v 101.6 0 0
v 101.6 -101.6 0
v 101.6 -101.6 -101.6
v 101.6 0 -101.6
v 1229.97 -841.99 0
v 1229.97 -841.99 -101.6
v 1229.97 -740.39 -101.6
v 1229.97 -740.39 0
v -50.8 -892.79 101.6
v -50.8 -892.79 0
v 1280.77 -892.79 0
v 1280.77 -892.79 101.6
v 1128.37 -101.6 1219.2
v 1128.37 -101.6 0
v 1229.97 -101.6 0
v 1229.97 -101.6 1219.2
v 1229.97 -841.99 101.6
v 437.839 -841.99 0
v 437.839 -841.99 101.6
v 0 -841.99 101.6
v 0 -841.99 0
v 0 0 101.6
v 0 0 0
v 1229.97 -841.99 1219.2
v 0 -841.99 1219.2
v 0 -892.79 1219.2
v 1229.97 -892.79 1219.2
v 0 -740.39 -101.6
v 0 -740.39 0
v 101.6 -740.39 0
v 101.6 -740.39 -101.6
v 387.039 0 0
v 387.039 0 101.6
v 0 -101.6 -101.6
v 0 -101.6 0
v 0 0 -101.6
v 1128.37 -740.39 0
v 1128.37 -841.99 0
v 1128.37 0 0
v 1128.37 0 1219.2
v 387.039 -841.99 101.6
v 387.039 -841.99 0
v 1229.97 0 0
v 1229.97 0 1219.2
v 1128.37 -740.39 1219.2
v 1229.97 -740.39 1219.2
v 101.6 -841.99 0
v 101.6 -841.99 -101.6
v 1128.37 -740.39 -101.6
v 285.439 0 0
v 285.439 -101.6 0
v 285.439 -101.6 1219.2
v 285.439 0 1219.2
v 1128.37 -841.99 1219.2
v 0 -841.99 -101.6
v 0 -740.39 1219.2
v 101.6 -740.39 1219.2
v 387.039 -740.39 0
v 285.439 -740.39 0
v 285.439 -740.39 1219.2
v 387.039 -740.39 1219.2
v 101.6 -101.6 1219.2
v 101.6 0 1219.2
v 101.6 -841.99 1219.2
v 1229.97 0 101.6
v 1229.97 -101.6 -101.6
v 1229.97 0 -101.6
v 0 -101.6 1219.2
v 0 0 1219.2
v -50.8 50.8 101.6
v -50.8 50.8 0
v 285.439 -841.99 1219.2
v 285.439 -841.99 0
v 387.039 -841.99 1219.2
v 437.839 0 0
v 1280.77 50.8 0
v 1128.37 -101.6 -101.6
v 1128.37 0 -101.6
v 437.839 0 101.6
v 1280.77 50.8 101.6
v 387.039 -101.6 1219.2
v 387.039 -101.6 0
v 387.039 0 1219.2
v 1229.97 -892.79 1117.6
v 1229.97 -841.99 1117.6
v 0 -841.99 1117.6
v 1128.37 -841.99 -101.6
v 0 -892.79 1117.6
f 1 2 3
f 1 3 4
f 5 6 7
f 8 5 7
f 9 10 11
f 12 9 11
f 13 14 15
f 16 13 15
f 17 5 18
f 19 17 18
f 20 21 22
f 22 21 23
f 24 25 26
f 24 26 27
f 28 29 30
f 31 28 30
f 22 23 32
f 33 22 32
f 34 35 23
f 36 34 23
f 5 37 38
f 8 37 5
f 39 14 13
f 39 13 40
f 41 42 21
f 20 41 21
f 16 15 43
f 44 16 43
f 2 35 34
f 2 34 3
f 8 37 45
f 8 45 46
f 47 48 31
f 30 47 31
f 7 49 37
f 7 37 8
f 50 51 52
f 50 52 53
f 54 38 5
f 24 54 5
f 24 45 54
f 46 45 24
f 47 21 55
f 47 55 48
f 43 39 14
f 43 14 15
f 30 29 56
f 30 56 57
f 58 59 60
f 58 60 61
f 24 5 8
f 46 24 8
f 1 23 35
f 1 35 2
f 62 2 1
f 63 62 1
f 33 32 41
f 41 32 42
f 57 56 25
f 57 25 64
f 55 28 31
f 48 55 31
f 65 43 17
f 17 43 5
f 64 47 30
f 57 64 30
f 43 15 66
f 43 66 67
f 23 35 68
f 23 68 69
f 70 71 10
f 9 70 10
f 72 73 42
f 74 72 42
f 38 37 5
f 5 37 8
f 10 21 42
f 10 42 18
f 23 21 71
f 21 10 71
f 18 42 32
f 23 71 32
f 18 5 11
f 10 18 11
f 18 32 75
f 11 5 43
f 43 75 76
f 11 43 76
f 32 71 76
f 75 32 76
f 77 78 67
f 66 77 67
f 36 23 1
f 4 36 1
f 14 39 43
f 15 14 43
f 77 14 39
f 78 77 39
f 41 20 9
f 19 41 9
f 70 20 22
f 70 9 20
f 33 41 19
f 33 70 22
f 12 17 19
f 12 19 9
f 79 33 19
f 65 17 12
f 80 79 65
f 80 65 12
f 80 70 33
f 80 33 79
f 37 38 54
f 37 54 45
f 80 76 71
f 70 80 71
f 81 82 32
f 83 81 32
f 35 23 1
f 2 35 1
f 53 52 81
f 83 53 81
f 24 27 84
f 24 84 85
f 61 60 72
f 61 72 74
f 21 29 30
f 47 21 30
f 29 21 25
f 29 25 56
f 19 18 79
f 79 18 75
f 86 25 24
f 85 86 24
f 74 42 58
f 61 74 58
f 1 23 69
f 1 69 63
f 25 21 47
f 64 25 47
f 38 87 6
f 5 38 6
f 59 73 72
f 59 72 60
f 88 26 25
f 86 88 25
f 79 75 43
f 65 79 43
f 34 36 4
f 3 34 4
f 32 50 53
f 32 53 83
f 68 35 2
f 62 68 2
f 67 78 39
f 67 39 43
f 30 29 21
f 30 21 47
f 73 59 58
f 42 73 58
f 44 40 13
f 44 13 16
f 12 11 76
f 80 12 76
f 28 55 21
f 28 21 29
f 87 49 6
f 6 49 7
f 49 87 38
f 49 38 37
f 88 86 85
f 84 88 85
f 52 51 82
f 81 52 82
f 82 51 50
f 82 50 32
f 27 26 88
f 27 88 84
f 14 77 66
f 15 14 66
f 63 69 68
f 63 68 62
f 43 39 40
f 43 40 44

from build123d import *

# Parameters (mm, degrees)
F0_W     = 101.6
F0_H     = 101.6
F1_DEPTH = 1219.2
F2_DEPTH = 101.6
F3_DEPTH = 101.6
F4_W     = 1229.9696
F4_H     = 50.8
F5_DEPTH = 101.6


with BuildPart() as f1:
    # F0 (on Top) → F1 (new body)
    with BuildSketch(Plane.XY):
        with Locations((50.8, -791.189994)):
            Rectangle(F0_W, F0_H)
        with Locations((50.8, -50.8)):
            Rectangle(F0_W, F0_H)
        with Locations((336.238925, -791.189994)):
            Rectangle(F0_W, F0_H)
        with Locations((336.238925, -50.8)):
            Rectangle(F0_W, F0_H)
        with Locations((1179.1696, -50.8)):
            Rectangle(F0_W, F0_H)
        with Locations((1179.1696, -791.189994)):
            Rectangle(F0_W, F0_H)
    extrude(amount=F1_DEPTH)


with BuildPart() as f2:
    # F0 (on Top) → F2 (new body)
    with BuildSketch(Plane.XY):
        Polygon((0, -101.6), (0, 0), (0, 50.8), (-50.8, 50.8), (-50.8, -892.789994), (0, -892.789994), (0, -841.989994), (0, -740.389994), align=None)
        Polygon((101.6, -841.989994), (0, -841.989994), (0, -892.789994), (1229.9696, -892.789994), (1229.9696, -841.989994), (1128.3696, -841.989994), (437.838925, -841.989994), (387.038925, -841.989994), (285.438925, -841.989994), align=None)
        Polygon((1280.7696, 50.8), (1229.9696, 50.8), (1229.9696, 0), (1229.9696, -101.6), (1229.9696, -740.389994), (1229.9696, -841.989994), (1229.9696, -892.789994), (1280.7696, -892.789994), align=None)
        Polygon((0, 50.8), (0, 0), (101.6, 0), (285.438925, 0), (387.038925, 0), (437.838925, 0), (1128.3696, 0), (1229.9696, 0), (1229.9696, 50.8), align=None)
        Polygon((437.838925, 0), (387.038925, 0), (387.038925, -101.6), (387.038925, -740.389994), (387.038925, -841.989994), (437.838925, -841.989994), align=None)
    extrude(amount=F2_DEPTH)


with BuildPart() as f3:
    # F0 (on Top) → F3 (new body)
    with BuildSketch(Plane.XY):
        with Locations((50.8, -791.189994)):
            Rectangle(F0_W, F0_H)
        with Locations((50.8, -50.8)):
            Rectangle(F0_W, F0_H)
        with Locations((1179.1696, -50.8)):
            Rectangle(F0_W, F0_H)
        with Locations((1179.1696, -791.189994)):
            Rectangle(F0_W, F0_H)
    extrude(amount=-F3_DEPTH)


with BuildPart() as f5:
    # F4 (on face) → F5 (new body)
    with BuildSketch(Plane.XY.offset(1219.2)):
        with Locations((614.9848, -867.389994)):
            Rectangle(F4_W, F4_H)
    extrude(amount=-F5_DEPTH)


solid = Compound([f1.part, f2.part, f3.part, f5.part])
